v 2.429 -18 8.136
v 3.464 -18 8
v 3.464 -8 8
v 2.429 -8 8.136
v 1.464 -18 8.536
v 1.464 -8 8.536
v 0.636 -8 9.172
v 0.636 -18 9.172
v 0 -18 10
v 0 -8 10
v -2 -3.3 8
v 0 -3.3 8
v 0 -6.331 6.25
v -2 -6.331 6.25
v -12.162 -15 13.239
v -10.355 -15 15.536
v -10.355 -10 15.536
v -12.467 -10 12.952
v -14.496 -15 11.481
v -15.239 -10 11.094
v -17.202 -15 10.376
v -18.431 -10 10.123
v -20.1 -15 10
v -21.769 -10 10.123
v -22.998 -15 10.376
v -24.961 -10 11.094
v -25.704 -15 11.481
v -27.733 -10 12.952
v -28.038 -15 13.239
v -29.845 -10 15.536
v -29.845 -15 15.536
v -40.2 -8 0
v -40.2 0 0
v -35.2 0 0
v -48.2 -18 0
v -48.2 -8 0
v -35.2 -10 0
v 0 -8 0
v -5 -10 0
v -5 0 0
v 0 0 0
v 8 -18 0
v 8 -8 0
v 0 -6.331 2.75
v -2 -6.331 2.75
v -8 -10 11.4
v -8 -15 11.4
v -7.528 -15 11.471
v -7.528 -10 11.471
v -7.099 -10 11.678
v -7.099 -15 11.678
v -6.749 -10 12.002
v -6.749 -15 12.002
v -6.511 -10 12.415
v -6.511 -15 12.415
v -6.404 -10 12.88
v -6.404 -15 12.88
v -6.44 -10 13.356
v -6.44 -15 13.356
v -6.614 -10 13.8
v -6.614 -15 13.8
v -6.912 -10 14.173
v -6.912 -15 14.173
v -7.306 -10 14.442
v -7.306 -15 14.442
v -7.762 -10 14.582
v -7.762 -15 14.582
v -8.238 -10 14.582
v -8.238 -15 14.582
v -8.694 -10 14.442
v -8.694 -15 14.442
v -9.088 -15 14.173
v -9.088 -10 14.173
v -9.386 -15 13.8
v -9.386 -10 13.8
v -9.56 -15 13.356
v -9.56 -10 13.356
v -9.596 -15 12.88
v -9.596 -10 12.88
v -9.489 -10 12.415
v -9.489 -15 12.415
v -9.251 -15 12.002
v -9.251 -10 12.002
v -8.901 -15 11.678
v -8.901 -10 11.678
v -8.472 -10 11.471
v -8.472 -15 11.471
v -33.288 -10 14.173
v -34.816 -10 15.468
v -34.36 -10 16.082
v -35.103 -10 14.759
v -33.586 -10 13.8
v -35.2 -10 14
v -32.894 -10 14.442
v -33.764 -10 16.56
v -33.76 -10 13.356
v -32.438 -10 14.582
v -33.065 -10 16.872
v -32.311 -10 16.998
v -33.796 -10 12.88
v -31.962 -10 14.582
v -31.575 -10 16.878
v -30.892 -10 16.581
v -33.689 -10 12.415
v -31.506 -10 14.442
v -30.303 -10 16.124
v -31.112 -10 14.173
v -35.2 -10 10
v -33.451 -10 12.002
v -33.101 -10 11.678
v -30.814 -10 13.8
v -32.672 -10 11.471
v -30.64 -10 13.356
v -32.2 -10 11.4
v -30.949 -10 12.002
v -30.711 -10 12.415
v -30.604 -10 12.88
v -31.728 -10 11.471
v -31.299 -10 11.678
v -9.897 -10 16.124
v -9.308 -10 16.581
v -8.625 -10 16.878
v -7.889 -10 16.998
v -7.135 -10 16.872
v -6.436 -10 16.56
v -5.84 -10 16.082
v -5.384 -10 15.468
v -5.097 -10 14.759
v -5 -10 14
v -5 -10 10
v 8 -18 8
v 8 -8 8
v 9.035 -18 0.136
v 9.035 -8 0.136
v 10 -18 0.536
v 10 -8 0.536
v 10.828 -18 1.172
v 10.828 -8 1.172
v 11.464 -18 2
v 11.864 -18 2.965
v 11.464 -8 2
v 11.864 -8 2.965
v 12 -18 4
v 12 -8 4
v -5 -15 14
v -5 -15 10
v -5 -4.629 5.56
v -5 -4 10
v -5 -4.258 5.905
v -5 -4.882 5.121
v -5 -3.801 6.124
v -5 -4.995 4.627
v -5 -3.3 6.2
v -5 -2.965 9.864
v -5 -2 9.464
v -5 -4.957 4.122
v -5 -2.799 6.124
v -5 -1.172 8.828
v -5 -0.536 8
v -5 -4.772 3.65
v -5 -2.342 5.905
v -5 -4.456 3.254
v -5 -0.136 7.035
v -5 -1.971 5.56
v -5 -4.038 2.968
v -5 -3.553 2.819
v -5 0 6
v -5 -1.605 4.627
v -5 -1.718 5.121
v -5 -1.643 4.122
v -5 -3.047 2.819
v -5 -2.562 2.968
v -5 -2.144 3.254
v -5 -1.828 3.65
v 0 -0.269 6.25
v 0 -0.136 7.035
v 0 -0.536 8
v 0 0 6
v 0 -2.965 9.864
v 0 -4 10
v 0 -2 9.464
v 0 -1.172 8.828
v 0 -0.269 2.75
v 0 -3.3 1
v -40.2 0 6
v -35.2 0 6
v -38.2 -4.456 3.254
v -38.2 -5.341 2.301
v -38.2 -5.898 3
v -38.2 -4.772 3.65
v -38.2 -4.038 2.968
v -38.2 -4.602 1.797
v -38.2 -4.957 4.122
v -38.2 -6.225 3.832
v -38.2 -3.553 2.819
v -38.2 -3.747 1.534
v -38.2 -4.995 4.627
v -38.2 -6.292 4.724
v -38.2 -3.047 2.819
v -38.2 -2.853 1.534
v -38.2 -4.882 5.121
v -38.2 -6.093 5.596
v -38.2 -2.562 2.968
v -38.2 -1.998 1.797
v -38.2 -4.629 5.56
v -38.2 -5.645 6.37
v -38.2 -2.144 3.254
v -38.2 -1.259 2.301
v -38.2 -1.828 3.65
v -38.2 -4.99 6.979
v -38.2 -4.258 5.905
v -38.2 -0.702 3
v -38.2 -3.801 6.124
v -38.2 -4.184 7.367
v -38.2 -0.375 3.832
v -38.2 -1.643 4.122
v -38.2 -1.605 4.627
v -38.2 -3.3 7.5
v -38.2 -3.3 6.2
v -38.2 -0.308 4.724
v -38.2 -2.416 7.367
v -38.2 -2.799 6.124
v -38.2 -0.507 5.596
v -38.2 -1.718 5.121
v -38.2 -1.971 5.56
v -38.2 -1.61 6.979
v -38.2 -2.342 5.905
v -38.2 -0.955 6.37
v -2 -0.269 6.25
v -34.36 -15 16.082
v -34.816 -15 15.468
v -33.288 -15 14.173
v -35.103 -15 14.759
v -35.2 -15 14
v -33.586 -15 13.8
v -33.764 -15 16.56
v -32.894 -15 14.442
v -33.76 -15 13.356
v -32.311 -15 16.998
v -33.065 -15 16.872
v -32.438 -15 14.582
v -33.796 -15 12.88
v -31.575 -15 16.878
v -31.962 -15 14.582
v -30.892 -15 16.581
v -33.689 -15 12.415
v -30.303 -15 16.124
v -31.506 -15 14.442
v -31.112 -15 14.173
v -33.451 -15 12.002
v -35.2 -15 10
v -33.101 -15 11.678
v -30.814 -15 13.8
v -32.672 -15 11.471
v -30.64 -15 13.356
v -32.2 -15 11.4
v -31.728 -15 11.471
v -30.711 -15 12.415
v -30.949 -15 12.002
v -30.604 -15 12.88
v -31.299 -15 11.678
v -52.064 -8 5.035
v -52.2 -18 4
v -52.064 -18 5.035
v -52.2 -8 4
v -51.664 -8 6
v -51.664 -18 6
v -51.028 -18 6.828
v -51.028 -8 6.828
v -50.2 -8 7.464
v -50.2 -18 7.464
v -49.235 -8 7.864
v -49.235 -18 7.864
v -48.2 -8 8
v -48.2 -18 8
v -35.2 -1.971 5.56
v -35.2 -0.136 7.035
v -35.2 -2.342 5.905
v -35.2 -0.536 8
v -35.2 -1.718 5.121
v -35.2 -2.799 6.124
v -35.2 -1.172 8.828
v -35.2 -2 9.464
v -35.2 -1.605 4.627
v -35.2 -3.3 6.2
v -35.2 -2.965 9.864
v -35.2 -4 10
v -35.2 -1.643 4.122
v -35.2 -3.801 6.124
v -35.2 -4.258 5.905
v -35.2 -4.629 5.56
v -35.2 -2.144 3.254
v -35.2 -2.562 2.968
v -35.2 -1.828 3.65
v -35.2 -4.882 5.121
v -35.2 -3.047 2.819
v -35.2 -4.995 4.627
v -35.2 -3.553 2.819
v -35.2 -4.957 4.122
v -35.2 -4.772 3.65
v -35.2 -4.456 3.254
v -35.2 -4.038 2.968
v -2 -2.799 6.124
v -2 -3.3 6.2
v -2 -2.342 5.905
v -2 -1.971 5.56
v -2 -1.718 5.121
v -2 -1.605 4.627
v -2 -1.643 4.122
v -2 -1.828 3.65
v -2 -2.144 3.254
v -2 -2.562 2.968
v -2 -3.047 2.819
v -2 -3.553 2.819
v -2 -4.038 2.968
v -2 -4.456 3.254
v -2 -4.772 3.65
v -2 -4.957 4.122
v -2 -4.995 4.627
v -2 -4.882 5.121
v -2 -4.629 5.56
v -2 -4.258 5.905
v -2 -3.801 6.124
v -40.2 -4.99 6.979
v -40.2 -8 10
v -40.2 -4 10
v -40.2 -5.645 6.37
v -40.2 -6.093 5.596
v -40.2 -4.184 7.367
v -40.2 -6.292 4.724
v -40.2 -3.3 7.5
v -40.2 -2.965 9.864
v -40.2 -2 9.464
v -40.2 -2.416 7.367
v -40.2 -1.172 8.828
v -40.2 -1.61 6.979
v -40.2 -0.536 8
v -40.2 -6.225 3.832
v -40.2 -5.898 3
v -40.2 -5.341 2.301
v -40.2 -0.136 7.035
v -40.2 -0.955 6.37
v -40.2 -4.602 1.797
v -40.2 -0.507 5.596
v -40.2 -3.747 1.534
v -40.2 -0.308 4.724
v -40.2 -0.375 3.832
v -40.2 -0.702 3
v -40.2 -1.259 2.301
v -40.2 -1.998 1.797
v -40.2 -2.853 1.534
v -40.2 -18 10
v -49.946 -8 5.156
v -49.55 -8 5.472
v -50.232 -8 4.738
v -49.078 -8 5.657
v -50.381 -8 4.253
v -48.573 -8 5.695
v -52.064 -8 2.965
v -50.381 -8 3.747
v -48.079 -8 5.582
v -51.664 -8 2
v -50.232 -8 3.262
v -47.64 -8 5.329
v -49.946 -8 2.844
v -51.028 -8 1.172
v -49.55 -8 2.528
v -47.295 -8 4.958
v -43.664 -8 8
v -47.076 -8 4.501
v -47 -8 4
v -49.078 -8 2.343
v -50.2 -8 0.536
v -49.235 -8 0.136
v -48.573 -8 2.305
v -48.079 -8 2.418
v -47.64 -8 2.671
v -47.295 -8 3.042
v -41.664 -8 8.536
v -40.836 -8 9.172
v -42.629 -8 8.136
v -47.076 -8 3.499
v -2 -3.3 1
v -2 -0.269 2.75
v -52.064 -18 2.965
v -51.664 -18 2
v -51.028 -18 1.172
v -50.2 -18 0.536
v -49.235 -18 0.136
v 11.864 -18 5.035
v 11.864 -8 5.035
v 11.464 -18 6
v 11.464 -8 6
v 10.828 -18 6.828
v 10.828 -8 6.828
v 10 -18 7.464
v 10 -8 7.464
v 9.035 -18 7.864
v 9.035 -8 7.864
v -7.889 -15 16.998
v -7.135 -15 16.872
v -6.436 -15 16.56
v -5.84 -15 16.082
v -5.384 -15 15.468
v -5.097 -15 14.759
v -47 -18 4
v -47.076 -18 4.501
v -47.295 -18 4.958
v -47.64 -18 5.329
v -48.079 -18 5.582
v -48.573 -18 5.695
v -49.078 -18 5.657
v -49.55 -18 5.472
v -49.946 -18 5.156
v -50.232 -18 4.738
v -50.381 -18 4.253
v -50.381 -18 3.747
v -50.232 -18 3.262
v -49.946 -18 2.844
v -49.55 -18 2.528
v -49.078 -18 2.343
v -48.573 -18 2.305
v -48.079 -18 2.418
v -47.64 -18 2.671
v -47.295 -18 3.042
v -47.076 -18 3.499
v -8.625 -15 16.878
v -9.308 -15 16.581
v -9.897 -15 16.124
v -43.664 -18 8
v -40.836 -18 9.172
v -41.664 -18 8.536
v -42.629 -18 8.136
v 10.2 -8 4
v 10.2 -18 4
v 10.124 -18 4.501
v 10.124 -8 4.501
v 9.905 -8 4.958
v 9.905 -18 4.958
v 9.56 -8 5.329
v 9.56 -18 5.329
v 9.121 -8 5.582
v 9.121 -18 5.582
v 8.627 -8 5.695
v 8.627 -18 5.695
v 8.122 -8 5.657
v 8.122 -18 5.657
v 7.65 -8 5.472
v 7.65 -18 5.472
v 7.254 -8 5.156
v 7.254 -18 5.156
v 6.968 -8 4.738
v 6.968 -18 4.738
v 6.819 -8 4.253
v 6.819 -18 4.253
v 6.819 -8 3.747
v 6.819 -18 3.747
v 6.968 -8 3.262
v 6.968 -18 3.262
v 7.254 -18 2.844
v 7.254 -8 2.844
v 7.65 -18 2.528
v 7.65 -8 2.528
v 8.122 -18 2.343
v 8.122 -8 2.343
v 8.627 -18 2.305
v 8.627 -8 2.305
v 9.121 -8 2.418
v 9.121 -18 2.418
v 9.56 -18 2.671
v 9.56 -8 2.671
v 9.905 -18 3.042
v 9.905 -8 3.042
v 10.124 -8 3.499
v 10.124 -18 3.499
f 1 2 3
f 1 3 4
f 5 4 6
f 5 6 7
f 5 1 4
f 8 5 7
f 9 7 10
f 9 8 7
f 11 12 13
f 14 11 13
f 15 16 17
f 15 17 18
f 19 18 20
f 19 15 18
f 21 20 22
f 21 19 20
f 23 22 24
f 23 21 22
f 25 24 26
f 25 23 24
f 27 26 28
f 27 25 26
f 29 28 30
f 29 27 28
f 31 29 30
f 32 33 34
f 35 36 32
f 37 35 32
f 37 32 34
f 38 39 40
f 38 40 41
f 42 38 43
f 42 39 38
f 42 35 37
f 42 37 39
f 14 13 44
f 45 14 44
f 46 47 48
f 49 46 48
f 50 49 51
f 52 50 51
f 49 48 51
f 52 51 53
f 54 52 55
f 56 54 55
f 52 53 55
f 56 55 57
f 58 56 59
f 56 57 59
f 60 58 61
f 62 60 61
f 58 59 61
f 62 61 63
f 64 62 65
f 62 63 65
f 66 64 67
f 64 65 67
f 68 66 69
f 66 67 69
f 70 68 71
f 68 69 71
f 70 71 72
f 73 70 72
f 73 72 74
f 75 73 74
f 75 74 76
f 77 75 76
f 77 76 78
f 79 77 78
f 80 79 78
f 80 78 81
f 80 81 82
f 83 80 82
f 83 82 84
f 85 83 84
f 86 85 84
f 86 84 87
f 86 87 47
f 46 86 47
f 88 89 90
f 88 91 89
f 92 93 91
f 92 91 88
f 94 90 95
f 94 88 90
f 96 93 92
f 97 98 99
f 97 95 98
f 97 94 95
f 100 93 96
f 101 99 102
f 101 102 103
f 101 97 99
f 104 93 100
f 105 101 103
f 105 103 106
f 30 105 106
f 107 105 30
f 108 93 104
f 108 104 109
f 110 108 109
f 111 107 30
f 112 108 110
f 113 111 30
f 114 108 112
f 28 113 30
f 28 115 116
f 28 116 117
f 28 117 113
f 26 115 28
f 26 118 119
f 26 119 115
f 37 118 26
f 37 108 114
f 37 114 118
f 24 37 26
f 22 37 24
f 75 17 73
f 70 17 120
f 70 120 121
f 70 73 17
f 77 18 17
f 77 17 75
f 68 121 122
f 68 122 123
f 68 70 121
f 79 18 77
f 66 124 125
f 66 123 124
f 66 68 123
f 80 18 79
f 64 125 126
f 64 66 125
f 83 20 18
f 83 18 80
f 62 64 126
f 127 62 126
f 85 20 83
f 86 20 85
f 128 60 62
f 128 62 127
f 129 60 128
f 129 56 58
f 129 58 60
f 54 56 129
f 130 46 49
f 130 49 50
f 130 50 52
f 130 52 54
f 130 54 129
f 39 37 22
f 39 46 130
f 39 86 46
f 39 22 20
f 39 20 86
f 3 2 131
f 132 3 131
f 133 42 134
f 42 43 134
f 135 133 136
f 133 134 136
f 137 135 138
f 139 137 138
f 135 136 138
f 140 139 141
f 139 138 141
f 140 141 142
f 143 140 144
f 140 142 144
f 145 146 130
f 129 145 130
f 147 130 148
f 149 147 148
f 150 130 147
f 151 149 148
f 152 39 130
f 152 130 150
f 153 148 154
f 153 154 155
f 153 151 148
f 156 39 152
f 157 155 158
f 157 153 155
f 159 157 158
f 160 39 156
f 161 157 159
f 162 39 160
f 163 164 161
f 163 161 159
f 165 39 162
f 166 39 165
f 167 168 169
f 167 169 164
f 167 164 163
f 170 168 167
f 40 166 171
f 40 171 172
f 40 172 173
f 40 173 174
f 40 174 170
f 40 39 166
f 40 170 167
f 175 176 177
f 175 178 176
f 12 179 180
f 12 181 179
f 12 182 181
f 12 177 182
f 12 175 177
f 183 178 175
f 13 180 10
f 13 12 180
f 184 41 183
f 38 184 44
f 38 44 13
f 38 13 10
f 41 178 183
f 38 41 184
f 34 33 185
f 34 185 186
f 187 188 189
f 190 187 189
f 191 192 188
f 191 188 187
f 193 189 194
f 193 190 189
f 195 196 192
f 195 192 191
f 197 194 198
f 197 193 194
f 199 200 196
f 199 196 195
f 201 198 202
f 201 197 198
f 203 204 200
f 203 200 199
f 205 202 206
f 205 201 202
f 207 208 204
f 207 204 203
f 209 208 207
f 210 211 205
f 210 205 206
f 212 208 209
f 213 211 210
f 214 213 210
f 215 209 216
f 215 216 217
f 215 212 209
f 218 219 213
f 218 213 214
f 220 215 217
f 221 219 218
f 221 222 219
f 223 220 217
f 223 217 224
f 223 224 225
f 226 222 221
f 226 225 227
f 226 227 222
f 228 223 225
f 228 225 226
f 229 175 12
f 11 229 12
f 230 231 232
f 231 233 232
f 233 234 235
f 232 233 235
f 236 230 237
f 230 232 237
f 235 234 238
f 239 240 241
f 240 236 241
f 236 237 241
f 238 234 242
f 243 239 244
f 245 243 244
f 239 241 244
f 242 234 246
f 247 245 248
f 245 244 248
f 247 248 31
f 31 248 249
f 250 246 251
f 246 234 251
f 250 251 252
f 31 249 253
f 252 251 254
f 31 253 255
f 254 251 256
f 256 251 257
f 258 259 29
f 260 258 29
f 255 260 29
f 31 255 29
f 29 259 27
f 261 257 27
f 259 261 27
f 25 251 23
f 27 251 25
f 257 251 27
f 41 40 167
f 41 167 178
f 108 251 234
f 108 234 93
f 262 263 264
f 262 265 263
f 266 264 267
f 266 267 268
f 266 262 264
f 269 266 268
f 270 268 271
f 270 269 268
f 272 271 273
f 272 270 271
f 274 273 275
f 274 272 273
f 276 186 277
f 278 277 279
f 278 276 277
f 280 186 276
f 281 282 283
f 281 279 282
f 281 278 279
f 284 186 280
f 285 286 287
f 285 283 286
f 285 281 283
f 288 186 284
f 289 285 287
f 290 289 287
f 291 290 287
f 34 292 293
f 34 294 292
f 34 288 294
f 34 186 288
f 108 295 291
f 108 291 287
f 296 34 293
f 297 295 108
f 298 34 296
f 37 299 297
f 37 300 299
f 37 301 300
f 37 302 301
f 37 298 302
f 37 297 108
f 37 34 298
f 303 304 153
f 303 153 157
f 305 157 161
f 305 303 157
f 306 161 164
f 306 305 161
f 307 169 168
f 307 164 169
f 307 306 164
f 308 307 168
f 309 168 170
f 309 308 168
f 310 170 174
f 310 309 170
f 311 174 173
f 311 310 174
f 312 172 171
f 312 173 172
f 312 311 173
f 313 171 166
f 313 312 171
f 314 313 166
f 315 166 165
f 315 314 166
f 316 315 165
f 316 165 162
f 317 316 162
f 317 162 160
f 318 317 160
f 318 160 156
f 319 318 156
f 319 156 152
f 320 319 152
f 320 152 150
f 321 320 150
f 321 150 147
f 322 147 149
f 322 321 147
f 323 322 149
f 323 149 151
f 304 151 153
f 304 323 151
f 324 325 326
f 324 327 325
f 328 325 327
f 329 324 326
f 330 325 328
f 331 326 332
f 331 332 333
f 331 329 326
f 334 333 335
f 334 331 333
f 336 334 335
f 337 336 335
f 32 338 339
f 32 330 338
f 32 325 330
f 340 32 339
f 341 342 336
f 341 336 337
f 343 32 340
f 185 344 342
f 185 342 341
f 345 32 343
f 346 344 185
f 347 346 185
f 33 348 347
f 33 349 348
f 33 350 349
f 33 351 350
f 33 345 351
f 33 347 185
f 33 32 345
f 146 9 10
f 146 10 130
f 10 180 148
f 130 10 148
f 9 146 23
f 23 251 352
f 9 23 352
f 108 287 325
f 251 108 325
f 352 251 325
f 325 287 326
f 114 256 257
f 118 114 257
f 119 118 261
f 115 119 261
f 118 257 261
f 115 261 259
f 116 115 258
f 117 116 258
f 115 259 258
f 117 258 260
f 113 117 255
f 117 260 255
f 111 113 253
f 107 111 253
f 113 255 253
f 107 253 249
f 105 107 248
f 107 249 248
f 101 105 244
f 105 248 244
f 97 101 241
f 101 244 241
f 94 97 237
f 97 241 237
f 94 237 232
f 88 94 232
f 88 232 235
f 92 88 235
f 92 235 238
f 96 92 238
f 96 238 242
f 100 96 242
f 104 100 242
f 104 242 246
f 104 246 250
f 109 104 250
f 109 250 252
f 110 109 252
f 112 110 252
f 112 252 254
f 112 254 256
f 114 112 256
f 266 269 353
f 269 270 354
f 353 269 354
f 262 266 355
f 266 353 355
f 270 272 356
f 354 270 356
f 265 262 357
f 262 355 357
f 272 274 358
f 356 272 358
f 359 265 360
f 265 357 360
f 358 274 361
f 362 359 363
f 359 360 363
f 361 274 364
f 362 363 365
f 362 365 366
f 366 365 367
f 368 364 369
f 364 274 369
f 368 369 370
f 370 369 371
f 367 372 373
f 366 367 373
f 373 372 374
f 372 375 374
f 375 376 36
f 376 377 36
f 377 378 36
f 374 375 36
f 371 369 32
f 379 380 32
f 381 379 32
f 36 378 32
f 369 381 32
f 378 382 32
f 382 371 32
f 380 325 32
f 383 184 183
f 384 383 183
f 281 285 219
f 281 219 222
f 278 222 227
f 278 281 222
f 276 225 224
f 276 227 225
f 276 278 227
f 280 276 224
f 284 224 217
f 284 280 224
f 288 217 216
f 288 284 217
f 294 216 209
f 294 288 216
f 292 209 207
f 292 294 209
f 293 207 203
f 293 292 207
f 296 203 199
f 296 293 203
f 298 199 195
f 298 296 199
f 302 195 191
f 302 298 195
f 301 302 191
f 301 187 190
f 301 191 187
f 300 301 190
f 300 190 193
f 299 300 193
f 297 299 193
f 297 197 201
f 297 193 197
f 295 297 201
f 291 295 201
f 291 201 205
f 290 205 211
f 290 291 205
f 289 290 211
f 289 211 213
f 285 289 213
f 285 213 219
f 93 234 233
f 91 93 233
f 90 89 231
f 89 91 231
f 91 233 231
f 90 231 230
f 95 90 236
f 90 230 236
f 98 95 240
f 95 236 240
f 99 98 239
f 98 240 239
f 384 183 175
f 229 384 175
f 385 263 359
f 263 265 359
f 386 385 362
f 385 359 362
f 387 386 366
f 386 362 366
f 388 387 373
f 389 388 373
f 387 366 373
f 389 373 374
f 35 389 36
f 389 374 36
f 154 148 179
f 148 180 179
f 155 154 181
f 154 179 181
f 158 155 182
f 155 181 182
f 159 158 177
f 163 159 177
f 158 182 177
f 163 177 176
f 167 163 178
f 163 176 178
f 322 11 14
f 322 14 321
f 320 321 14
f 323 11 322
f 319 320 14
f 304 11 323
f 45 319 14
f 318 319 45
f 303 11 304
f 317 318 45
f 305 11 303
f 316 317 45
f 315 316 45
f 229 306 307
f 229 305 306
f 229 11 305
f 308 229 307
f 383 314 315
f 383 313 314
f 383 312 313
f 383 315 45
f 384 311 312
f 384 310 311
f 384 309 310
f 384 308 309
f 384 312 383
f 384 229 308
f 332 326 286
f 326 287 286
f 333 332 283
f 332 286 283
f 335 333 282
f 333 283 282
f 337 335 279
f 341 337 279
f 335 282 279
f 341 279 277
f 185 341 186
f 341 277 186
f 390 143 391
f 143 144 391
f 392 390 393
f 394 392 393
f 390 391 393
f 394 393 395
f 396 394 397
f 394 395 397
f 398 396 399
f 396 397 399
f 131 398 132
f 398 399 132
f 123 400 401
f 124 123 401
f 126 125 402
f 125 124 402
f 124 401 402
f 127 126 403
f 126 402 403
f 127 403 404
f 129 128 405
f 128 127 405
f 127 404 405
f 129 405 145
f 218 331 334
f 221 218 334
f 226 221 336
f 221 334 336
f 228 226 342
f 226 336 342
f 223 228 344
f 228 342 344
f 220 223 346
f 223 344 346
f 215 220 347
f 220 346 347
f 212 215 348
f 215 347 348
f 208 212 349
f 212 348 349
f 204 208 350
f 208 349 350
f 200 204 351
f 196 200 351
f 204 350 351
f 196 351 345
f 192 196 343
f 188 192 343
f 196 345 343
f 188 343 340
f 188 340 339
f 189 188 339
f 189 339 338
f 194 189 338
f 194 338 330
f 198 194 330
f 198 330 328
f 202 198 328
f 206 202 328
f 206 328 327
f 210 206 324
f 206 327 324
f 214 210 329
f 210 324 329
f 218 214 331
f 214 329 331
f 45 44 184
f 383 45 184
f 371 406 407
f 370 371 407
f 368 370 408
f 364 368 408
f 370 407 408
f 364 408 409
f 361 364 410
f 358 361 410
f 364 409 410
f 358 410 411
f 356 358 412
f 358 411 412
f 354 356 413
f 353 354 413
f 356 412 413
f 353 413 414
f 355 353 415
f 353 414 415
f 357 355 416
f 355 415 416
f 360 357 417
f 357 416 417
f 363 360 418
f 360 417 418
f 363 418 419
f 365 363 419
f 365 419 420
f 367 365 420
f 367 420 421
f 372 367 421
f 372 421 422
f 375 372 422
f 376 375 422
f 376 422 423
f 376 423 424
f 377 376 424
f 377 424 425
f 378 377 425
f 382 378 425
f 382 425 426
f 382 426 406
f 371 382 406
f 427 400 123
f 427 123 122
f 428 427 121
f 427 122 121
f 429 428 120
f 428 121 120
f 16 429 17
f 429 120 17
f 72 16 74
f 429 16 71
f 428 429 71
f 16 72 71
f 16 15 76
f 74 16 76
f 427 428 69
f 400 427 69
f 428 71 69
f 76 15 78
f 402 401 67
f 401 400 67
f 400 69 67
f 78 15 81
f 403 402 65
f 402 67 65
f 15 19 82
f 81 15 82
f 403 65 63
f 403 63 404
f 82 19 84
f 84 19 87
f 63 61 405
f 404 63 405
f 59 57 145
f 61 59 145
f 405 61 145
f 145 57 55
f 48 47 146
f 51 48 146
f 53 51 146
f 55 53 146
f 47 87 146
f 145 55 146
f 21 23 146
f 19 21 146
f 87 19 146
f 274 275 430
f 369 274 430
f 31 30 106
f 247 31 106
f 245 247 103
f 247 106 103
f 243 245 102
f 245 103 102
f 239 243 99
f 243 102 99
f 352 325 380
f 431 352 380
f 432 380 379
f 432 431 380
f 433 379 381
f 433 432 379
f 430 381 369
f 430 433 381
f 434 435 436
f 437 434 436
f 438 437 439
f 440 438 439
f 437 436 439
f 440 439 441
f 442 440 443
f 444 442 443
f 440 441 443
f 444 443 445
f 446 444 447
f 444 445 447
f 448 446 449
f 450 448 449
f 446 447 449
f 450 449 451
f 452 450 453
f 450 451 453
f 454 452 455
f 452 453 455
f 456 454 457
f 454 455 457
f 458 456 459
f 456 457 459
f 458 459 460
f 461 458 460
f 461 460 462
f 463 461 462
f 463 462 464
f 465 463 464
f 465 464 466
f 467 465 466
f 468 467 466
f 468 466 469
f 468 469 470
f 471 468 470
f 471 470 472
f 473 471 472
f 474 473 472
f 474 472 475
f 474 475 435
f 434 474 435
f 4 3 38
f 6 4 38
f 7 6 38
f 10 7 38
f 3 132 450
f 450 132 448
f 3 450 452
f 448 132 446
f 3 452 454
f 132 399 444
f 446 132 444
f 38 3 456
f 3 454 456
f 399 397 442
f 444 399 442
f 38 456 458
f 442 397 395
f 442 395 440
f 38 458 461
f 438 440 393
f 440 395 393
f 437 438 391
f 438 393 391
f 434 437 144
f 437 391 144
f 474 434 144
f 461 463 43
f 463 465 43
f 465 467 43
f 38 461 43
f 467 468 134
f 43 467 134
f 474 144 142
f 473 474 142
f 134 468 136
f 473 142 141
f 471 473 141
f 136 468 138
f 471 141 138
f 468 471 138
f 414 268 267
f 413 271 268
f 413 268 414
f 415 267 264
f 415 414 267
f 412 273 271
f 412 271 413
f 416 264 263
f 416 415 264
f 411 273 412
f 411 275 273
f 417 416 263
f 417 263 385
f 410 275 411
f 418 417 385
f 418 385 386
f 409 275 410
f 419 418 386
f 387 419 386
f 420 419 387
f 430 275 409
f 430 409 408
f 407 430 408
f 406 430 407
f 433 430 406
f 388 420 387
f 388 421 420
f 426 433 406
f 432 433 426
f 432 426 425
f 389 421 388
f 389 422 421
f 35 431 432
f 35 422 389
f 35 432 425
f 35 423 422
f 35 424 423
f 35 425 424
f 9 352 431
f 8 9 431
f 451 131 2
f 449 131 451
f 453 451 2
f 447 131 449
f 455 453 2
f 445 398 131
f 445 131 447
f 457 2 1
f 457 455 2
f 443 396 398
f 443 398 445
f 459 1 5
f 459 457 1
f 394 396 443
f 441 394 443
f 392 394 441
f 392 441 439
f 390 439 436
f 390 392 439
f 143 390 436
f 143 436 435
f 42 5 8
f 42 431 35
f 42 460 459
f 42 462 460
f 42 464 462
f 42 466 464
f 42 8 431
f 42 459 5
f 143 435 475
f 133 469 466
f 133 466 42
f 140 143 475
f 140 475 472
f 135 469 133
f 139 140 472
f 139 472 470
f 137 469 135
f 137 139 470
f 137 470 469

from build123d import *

# Parameters (mm, degrees)
BOSS_EXTRU_1_DEPTH           = 10
ESQUISSE2_W                  = 30.2
ESQUISSE2_H                  = 5
BOSS_EXTRU_2_DEPTH           = 9
ENL_V_MAT_EXTRU_1_DEPTH      = 47.925899032
ESQUISSE4_R                  = 1.6
ENL_V_MAT_EXTRU_2_DEPTH      = 47.925899032
ESQUISSE5_W                  = 30.2
ESQUISSE5_H                  = 2
ENL_V_MAT_EXTRU_3_DEPTH      = 47.925899032
CONG_2_R                     = 3
ESQUISSE6_W                  = 12
ESQUISSE6_H                  = 8
BOSS_EXTRU_3_DEPTH           = 10
ESQUISSE7_R                  = 1.7
ENL_V_MAT_EXTRU_4_DEPTH      = 58.773438571
CONG_3_R                     = 4
ENL_V_MAT_EXTRU_5_DEPTH      = 54.298876201
ENL_V_MAT_EXTRU_5_DEPTH_BACK = 54.298876201
ESQUISSE8_R                  = 1.7
ESQUISSE9_R                  = 3
ENL_V_MAT_EXTRU_6_DEPTH      = 2
ENL_V_MAT_EXTRU_7_DEPTH      = 2
CONG_4_R                     = 4
CONG_5_R                     = 4


# Some blends are built 0.0001 mm under size
with BuildPart() as part:
    # Esquisse1 → Boss.-Extru.1 (new body)
    with BuildSketch(Plane.XY):
        Polygon((-40.2, 0), (-35.2, 0), (-35.2, -10), (-5, -10), (-5, 0), (0, 0), (0, -18), (-40.2, -18), align=None)
    extrude(amount=BOSS_EXTRU_1_DEPTH)

    # Esquisse2 → Boss.-Extru.2 (add)
    with BuildSketch(Plane.XY.offset(10)):
        with Locations((-20.1, -12.5)):
            Rectangle(ESQUISSE2_W, ESQUISSE2_H)
    extrude(amount=BOSS_EXTRU_2_DEPTH)

    # Esquisse3 → Enlèv. mat.-Extru.1 (cut, through all)
    with BuildSketch(Plane.XZ.offset(15)):
        with BuildLine():
            Line((-31.2, 19), (-9, 19))
            ThreePointArc((-9, 19), (-20.1, 10), (-31.2, 19))
        make_face()
    extrude(amount=-ENL_V_MAT_EXTRU_1_DEPTH, mode=Mode.SUBTRACT)

    # Esquisse4 → Enlèv. mat.-Extru.2 (cut, through all)
    with BuildSketch(Plane.XZ.offset(15)):
        with Locations(Location((-32.2, 13, 0), (0, 0, 270))):
            Circle(ESQUISSE4_R)
        with Locations(Location((-8, 13, 0), (0, 0, 270))):
            Circle(ESQUISSE4_R)
    extrude(amount=-ENL_V_MAT_EXTRU_2_DEPTH, mode=Mode.SUBTRACT)

    # Esquisse5 → Enlèv. mat.-Extru.3 (cut, through all)
    with BuildSketch(Plane.XZ.offset(15)):
        with Locations((-20.1, 18)):
            Rectangle(ESQUISSE5_W, ESQUISSE5_H)
    extrude(amount=-ENL_V_MAT_EXTRU_3_DEPTH, mode=Mode.SUBTRACT)

    # Congé2
    # the kernel refuses this fillet: 3 mm, written as the material it takes off along each edge
    with BuildSketch(Plane(origin=(-5, -22.5, 17), x_dir=(0, 0, -1), z_dir=(0, 1, 0))) as cong_2_piece_1:
        with BuildLine():
            CenterArc((CONG_2_R, CONG_2_R), CONG_2_R, 180, 90)
            Line((0, CONG_2_R), (0, 0))
            Line((0, 0), (CONG_2_R, 0))
        make_face()
    extrude(amount=20, mode=Mode.SUBTRACT)
    with BuildSketch(Plane(origin=(-9.620019084, -5.395123123, 17), x_dir=(1, 0, 0), z_dir=(0, -1, 0))) as cong_2_piece_2:
        with BuildLine():
            CenterArc((1.841950751, -3), CONG_2_R, 90, 59.201185251)
            ThreePointArc((-0.734960717, -1.463924712), (-0.341024539, -0.745244452), (0, 0))
            Line((0, 0), (1.841950751, 0))
        make_face()
    extrude(amount=14.209753754, mode=Mode.SUBTRACT)
    with BuildSketch(Plane(origin=(-30.579980916, -5.395123123, 17), x_dir=(0.4486773426104955, 0, -0.8936938190610831), z_dir=(0, -1, 0))) as cong_2_piece_3:
        with BuildLine():
            CenterArc((1.854639889, -2.992172029), CONG_2_R, 94.139959503, 59.201185251)
            Line((-0.826441568, -1.646140001), (0, 0))
            ThreePointArc((0, 0), (0.819030344, -0.029602778), (1.638060688, 0))
        make_face()
    extrude(amount=14.209753754, mode=Mode.SUBTRACT)
    with BuildSketch(Plane(origin=(-35.2, -22.5, 17), x_dir=(0, 0, -1), z_dir=(0, 1, 0))) as cong_2_piece_4:
        with BuildLine():
            CenterArc((CONG_2_R, -CONG_2_R), CONG_2_R, 90, 90)
            Line((0, -CONG_2_R), (0, 0))
            Line((0, 0), (CONG_2_R, 0))
        make_face()
    extrude(amount=20, mode=Mode.SUBTRACT)

    # Esquisse6 → Boss.-Extru.3 (add)
    with BuildSketch(Plane.XZ.offset(18)):
        with Locations((-46.2, 4)):
            Rectangle(ESQUISSE6_W, ESQUISSE6_H)
        with Locations((6, 4)):
            Rectangle(ESQUISSE6_W, ESQUISSE6_H)
    extrude(amount=-BOSS_EXTRU_3_DEPTH)

    # Esquisse7 → Enlèv. mat.-Extru.4 (cut, through all)
    with BuildSketch(Plane.XZ.offset(18)):
        with Locations((-48.7, 4)):
            Circle(ESQUISSE7_R)
        with Locations((8.5, 4)):
            Circle(ESQUISSE7_R)
    extrude(amount=-ENL_V_MAT_EXTRU_4_DEPTH, mode=Mode.SUBTRACT)

    # Congé3
    cong_3_edges = [part.edges().sort_by_distance(p)[0] for p in [
        (-52.2, -13, 8),
        (-52.2, -13, 0),
        (12, -13, 0),
        (12, -13, 8),
    ]]
    fillet(cong_3_edges, radius=CONG_3_R - 0.0001)  # a hair under: the kernel refuses the full size

    # Esquisse8 → Enlèv. mat.-Extru.5 (cut, two sides: drawn at the far end of the back side and taken through both)
    with BuildSketch(Plane.ZY.offset(5).offset(-ENL_V_MAT_EXTRU_5_DEPTH_BACK)):
        with Locations((4.5, -3.3)):
            Circle(ESQUISSE8_R)
    extrude(amount=ENL_V_MAT_EXTRU_5_DEPTH + ENL_V_MAT_EXTRU_5_DEPTH_BACK, mode=Mode.SUBTRACT)

    # Esquisse9 → Enlèv. mat.-Extru.6 (cut)
    with BuildSketch(Plane.ZY.offset(40.2)):
        with Locations((4.5, -3.3)):
            Circle(ESQUISSE9_R)
    extrude(amount=-ENL_V_MAT_EXTRU_6_DEPTH, mode=Mode.SUBTRACT)

    # Esquisse10 → Enlèv. mat.-Extru.7 (cut)
    with BuildSketch(Plane(origin=(0, 0, 0), x_dir=(0, 0, -1), z_dir=(1, 0, 0))):
        Polygon((-8, -3.3), (-6.25, -6.331088913), (-2.75, -6.331088913), (-1, -3.3), (-2.75, -0.268911087), (-6.25, -0.268911087), align=None)
    extrude(amount=-ENL_V_MAT_EXTRU_7_DEPTH, mode=Mode.SUBTRACT)

    # Congé4
    cong_4_edges = [part.edges().sort_by_distance(p)[0] for p in [
        (-2.5, 0, 10),
        (-37.7, 0, 10),
    ]]
    fillet(cong_4_edges, radius=CONG_4_R)

    # Congé5
    # the kernel refuses this fillet: 4 mm, written as the material it adds along each edge
    with BuildSketch(Plane(origin=(0, -18, 8), x_dir=(0, 0, 1), z_dir=(0, 1, 0))) as cong_5_piece_1:
        with BuildLine():
            CenterArc((4, 3.464101615), CONG_5_R, 180, 60)
            Line((0, 3.464101615), (0, 0))
            Line((0, 0), (2, 0))
        make_face()
    extrude(amount=10)
    with BuildSketch(Plane(origin=(-40.2, -18, 8), x_dir=(0, 0, 1), z_dir=(0, 1, 0))) as cong_5_piece_2:
        with BuildLine():
            CenterArc((4, -3.464101615), CONG_5_R, 120, 60)
            Line((0, -3.464101615), (0, 0))
            Line((0, 0), (2, 0))
        make_face()
    extrude(amount=10)


solid = part.part
